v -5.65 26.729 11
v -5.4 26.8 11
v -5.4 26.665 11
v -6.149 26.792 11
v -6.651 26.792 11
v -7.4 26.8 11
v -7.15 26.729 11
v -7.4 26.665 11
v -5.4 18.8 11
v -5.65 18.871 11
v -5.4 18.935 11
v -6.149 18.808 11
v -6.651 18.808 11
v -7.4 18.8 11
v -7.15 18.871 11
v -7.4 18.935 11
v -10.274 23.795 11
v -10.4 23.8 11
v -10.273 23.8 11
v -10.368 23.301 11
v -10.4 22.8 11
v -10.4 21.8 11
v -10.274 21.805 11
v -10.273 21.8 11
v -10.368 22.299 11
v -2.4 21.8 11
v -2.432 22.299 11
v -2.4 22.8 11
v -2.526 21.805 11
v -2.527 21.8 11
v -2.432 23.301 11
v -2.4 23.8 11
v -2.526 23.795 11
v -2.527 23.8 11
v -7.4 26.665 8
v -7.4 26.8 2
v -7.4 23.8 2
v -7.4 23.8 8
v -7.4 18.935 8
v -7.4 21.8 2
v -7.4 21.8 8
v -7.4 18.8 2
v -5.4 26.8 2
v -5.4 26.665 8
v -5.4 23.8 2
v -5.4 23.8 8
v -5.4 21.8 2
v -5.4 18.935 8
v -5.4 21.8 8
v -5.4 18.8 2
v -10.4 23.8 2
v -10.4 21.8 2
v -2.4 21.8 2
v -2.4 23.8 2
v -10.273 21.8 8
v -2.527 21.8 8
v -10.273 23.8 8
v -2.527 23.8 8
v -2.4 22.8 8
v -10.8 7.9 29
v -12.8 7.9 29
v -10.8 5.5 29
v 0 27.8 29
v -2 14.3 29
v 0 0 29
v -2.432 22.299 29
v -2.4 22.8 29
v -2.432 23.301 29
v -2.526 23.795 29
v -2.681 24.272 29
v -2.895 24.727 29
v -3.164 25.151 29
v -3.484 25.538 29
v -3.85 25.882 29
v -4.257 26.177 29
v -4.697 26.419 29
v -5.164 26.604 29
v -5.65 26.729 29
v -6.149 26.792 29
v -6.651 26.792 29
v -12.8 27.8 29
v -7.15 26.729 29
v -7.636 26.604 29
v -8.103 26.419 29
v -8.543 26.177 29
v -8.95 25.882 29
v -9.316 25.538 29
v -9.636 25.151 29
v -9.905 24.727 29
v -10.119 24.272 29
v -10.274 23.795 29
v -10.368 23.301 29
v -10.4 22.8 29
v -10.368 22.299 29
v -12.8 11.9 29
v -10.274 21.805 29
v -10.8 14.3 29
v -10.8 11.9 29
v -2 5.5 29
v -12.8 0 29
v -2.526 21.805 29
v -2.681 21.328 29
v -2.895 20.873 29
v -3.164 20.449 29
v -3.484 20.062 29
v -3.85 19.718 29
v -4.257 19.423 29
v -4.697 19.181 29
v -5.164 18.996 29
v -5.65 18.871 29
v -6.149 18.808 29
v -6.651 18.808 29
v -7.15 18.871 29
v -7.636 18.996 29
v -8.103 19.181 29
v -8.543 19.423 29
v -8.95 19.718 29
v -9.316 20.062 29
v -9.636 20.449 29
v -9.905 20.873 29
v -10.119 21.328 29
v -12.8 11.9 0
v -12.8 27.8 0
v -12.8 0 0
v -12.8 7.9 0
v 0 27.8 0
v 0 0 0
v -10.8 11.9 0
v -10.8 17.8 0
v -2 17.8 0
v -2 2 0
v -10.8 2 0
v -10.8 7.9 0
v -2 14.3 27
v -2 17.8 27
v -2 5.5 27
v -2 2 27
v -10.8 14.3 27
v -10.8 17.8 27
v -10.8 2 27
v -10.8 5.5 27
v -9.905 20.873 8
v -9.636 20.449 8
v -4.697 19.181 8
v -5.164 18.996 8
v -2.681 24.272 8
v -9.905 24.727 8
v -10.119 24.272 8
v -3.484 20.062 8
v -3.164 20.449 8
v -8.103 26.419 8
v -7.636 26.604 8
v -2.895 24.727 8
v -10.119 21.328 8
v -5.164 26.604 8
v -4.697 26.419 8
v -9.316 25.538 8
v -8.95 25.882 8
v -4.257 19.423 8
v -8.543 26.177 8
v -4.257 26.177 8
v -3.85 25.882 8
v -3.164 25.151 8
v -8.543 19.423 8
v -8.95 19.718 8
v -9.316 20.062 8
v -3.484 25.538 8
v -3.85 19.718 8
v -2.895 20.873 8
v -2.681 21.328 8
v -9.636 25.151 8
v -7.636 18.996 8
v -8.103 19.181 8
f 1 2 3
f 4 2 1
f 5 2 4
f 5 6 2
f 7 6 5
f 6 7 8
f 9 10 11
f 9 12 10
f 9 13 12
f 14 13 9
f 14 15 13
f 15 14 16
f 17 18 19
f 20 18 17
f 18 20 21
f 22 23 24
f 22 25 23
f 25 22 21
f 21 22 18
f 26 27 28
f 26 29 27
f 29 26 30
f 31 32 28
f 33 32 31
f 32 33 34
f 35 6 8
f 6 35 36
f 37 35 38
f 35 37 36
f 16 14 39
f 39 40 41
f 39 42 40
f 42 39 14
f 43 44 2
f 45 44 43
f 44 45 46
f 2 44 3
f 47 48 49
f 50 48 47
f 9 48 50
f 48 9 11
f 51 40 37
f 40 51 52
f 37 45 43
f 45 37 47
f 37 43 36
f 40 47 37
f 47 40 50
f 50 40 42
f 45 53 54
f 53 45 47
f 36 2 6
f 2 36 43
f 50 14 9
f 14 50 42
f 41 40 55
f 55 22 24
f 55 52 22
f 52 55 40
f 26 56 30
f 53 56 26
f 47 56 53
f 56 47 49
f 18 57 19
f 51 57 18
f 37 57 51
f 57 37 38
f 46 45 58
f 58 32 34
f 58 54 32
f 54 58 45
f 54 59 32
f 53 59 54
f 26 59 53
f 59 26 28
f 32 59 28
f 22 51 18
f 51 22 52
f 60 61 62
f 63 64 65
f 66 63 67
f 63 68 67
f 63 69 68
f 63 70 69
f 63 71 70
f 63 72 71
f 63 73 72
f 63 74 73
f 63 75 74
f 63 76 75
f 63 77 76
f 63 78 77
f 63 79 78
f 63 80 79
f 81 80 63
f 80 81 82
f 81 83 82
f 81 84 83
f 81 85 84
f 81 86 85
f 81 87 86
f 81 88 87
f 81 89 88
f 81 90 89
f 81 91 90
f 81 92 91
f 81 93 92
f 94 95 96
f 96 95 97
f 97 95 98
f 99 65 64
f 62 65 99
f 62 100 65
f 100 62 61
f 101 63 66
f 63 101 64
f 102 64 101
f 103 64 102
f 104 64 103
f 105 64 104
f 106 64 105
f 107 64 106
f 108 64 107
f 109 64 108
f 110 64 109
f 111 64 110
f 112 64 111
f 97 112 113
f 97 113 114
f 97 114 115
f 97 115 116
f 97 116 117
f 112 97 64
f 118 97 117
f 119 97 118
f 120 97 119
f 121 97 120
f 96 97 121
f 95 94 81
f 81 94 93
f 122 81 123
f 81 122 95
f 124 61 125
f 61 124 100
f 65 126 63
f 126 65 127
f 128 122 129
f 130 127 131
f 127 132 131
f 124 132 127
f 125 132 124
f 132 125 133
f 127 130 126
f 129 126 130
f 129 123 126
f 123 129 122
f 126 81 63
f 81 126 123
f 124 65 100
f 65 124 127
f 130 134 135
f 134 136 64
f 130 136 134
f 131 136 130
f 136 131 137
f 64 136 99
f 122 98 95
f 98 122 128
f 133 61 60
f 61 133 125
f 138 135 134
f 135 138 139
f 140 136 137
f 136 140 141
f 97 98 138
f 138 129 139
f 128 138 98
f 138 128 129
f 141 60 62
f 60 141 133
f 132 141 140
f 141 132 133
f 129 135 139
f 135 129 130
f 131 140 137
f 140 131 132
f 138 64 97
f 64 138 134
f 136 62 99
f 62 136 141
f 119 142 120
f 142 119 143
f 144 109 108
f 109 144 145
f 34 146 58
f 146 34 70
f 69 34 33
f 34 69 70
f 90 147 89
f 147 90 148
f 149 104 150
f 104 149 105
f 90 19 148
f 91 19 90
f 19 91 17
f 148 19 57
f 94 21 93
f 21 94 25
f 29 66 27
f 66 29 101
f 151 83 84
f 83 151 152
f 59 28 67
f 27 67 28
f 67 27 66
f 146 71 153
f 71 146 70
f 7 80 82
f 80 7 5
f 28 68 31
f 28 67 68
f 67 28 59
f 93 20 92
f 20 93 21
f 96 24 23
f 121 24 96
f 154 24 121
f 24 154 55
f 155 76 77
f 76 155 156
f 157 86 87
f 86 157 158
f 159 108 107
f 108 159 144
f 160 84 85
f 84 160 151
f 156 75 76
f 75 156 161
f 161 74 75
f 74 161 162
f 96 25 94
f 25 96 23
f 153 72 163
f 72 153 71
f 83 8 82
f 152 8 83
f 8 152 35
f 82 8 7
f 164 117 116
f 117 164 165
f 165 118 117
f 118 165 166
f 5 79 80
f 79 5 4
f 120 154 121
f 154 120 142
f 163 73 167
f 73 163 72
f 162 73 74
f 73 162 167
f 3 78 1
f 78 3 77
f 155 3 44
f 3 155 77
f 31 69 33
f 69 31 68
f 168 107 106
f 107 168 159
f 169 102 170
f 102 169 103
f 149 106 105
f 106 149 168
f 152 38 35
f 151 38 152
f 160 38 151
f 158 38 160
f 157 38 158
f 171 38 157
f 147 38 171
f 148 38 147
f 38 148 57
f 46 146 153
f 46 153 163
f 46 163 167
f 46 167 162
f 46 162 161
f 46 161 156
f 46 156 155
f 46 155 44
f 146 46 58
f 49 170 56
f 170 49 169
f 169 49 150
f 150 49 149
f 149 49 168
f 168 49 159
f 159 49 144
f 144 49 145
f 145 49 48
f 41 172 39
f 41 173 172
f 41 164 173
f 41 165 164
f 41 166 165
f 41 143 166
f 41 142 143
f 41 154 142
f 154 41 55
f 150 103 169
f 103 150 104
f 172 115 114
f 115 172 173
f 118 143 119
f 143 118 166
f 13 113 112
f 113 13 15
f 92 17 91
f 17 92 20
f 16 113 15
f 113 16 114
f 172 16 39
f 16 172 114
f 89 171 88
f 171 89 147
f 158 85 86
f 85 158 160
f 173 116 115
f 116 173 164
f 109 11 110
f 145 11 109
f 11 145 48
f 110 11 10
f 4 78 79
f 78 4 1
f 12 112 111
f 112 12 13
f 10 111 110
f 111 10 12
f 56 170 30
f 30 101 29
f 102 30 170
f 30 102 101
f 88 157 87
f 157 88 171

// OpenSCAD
//count of fragments for cylinders etc.
$fn=50;
//plug dimensions (including 1mm tolerance)
PLen=27; 
//width and height - for perfect sit, file down (including 0.8mm tolerance)
PWit=15.8;
PHig=8.8;
//cable diameter
CDia=4; 
//additional cutout right (including 0.8mm tolerance)
ACutR=8.8; 
//screwdriver/stick diameter (including 1mm tolerance)
StDia=8;

rotate([0,270,0]) //suggested print orientation - alternatively enable print support below - hint: if you print in other direction, possibly you have to change the tolerances
difference(){
    translate([0,0,0])
    cube([PLen+2,PWit+4+StDia,PHig+4]);
    
    //cable
    translate([-5,PWit/2,2])
    cube([PLen+12,CDia,PHig+4]);
    
    //plug
    translate([-2,2,2])
    cube([PLen+2,PWit,PHig]);
    
    //additional cutout right
    translate([10,(PWit+4-ACutR)/2,(PHig+4-ACutR)/2])
    cube([PLen,ACutR,ACutR]);
    
    //hole for stick
    translate([StDia,PWit+3+StDia/2,(PHig+4)/2])
    rotate([0,90,0])
    cylinder(h=PLen,d=StDia);
    //slits
    translate([2,PWit+3,PHig/2+1]){
        cube([StDia+1,StDia,2]);
        translate([0,StDia/2+1,-(StDia)/2+1])
        rotate([90,0,0])
        cube([StDia+1,StDia,2]);
    }
}

/*/print support inside
translate([3,4,2.8])
PrnSupport(PLen-6,PWit-4,PHig-1,5); //*/

module PrnSupport(x,y,z,step) {
    for (xl=[0:step:x]) {
        translate([xl,0,0])
        cube([0.5,y,z]);
    }
}
